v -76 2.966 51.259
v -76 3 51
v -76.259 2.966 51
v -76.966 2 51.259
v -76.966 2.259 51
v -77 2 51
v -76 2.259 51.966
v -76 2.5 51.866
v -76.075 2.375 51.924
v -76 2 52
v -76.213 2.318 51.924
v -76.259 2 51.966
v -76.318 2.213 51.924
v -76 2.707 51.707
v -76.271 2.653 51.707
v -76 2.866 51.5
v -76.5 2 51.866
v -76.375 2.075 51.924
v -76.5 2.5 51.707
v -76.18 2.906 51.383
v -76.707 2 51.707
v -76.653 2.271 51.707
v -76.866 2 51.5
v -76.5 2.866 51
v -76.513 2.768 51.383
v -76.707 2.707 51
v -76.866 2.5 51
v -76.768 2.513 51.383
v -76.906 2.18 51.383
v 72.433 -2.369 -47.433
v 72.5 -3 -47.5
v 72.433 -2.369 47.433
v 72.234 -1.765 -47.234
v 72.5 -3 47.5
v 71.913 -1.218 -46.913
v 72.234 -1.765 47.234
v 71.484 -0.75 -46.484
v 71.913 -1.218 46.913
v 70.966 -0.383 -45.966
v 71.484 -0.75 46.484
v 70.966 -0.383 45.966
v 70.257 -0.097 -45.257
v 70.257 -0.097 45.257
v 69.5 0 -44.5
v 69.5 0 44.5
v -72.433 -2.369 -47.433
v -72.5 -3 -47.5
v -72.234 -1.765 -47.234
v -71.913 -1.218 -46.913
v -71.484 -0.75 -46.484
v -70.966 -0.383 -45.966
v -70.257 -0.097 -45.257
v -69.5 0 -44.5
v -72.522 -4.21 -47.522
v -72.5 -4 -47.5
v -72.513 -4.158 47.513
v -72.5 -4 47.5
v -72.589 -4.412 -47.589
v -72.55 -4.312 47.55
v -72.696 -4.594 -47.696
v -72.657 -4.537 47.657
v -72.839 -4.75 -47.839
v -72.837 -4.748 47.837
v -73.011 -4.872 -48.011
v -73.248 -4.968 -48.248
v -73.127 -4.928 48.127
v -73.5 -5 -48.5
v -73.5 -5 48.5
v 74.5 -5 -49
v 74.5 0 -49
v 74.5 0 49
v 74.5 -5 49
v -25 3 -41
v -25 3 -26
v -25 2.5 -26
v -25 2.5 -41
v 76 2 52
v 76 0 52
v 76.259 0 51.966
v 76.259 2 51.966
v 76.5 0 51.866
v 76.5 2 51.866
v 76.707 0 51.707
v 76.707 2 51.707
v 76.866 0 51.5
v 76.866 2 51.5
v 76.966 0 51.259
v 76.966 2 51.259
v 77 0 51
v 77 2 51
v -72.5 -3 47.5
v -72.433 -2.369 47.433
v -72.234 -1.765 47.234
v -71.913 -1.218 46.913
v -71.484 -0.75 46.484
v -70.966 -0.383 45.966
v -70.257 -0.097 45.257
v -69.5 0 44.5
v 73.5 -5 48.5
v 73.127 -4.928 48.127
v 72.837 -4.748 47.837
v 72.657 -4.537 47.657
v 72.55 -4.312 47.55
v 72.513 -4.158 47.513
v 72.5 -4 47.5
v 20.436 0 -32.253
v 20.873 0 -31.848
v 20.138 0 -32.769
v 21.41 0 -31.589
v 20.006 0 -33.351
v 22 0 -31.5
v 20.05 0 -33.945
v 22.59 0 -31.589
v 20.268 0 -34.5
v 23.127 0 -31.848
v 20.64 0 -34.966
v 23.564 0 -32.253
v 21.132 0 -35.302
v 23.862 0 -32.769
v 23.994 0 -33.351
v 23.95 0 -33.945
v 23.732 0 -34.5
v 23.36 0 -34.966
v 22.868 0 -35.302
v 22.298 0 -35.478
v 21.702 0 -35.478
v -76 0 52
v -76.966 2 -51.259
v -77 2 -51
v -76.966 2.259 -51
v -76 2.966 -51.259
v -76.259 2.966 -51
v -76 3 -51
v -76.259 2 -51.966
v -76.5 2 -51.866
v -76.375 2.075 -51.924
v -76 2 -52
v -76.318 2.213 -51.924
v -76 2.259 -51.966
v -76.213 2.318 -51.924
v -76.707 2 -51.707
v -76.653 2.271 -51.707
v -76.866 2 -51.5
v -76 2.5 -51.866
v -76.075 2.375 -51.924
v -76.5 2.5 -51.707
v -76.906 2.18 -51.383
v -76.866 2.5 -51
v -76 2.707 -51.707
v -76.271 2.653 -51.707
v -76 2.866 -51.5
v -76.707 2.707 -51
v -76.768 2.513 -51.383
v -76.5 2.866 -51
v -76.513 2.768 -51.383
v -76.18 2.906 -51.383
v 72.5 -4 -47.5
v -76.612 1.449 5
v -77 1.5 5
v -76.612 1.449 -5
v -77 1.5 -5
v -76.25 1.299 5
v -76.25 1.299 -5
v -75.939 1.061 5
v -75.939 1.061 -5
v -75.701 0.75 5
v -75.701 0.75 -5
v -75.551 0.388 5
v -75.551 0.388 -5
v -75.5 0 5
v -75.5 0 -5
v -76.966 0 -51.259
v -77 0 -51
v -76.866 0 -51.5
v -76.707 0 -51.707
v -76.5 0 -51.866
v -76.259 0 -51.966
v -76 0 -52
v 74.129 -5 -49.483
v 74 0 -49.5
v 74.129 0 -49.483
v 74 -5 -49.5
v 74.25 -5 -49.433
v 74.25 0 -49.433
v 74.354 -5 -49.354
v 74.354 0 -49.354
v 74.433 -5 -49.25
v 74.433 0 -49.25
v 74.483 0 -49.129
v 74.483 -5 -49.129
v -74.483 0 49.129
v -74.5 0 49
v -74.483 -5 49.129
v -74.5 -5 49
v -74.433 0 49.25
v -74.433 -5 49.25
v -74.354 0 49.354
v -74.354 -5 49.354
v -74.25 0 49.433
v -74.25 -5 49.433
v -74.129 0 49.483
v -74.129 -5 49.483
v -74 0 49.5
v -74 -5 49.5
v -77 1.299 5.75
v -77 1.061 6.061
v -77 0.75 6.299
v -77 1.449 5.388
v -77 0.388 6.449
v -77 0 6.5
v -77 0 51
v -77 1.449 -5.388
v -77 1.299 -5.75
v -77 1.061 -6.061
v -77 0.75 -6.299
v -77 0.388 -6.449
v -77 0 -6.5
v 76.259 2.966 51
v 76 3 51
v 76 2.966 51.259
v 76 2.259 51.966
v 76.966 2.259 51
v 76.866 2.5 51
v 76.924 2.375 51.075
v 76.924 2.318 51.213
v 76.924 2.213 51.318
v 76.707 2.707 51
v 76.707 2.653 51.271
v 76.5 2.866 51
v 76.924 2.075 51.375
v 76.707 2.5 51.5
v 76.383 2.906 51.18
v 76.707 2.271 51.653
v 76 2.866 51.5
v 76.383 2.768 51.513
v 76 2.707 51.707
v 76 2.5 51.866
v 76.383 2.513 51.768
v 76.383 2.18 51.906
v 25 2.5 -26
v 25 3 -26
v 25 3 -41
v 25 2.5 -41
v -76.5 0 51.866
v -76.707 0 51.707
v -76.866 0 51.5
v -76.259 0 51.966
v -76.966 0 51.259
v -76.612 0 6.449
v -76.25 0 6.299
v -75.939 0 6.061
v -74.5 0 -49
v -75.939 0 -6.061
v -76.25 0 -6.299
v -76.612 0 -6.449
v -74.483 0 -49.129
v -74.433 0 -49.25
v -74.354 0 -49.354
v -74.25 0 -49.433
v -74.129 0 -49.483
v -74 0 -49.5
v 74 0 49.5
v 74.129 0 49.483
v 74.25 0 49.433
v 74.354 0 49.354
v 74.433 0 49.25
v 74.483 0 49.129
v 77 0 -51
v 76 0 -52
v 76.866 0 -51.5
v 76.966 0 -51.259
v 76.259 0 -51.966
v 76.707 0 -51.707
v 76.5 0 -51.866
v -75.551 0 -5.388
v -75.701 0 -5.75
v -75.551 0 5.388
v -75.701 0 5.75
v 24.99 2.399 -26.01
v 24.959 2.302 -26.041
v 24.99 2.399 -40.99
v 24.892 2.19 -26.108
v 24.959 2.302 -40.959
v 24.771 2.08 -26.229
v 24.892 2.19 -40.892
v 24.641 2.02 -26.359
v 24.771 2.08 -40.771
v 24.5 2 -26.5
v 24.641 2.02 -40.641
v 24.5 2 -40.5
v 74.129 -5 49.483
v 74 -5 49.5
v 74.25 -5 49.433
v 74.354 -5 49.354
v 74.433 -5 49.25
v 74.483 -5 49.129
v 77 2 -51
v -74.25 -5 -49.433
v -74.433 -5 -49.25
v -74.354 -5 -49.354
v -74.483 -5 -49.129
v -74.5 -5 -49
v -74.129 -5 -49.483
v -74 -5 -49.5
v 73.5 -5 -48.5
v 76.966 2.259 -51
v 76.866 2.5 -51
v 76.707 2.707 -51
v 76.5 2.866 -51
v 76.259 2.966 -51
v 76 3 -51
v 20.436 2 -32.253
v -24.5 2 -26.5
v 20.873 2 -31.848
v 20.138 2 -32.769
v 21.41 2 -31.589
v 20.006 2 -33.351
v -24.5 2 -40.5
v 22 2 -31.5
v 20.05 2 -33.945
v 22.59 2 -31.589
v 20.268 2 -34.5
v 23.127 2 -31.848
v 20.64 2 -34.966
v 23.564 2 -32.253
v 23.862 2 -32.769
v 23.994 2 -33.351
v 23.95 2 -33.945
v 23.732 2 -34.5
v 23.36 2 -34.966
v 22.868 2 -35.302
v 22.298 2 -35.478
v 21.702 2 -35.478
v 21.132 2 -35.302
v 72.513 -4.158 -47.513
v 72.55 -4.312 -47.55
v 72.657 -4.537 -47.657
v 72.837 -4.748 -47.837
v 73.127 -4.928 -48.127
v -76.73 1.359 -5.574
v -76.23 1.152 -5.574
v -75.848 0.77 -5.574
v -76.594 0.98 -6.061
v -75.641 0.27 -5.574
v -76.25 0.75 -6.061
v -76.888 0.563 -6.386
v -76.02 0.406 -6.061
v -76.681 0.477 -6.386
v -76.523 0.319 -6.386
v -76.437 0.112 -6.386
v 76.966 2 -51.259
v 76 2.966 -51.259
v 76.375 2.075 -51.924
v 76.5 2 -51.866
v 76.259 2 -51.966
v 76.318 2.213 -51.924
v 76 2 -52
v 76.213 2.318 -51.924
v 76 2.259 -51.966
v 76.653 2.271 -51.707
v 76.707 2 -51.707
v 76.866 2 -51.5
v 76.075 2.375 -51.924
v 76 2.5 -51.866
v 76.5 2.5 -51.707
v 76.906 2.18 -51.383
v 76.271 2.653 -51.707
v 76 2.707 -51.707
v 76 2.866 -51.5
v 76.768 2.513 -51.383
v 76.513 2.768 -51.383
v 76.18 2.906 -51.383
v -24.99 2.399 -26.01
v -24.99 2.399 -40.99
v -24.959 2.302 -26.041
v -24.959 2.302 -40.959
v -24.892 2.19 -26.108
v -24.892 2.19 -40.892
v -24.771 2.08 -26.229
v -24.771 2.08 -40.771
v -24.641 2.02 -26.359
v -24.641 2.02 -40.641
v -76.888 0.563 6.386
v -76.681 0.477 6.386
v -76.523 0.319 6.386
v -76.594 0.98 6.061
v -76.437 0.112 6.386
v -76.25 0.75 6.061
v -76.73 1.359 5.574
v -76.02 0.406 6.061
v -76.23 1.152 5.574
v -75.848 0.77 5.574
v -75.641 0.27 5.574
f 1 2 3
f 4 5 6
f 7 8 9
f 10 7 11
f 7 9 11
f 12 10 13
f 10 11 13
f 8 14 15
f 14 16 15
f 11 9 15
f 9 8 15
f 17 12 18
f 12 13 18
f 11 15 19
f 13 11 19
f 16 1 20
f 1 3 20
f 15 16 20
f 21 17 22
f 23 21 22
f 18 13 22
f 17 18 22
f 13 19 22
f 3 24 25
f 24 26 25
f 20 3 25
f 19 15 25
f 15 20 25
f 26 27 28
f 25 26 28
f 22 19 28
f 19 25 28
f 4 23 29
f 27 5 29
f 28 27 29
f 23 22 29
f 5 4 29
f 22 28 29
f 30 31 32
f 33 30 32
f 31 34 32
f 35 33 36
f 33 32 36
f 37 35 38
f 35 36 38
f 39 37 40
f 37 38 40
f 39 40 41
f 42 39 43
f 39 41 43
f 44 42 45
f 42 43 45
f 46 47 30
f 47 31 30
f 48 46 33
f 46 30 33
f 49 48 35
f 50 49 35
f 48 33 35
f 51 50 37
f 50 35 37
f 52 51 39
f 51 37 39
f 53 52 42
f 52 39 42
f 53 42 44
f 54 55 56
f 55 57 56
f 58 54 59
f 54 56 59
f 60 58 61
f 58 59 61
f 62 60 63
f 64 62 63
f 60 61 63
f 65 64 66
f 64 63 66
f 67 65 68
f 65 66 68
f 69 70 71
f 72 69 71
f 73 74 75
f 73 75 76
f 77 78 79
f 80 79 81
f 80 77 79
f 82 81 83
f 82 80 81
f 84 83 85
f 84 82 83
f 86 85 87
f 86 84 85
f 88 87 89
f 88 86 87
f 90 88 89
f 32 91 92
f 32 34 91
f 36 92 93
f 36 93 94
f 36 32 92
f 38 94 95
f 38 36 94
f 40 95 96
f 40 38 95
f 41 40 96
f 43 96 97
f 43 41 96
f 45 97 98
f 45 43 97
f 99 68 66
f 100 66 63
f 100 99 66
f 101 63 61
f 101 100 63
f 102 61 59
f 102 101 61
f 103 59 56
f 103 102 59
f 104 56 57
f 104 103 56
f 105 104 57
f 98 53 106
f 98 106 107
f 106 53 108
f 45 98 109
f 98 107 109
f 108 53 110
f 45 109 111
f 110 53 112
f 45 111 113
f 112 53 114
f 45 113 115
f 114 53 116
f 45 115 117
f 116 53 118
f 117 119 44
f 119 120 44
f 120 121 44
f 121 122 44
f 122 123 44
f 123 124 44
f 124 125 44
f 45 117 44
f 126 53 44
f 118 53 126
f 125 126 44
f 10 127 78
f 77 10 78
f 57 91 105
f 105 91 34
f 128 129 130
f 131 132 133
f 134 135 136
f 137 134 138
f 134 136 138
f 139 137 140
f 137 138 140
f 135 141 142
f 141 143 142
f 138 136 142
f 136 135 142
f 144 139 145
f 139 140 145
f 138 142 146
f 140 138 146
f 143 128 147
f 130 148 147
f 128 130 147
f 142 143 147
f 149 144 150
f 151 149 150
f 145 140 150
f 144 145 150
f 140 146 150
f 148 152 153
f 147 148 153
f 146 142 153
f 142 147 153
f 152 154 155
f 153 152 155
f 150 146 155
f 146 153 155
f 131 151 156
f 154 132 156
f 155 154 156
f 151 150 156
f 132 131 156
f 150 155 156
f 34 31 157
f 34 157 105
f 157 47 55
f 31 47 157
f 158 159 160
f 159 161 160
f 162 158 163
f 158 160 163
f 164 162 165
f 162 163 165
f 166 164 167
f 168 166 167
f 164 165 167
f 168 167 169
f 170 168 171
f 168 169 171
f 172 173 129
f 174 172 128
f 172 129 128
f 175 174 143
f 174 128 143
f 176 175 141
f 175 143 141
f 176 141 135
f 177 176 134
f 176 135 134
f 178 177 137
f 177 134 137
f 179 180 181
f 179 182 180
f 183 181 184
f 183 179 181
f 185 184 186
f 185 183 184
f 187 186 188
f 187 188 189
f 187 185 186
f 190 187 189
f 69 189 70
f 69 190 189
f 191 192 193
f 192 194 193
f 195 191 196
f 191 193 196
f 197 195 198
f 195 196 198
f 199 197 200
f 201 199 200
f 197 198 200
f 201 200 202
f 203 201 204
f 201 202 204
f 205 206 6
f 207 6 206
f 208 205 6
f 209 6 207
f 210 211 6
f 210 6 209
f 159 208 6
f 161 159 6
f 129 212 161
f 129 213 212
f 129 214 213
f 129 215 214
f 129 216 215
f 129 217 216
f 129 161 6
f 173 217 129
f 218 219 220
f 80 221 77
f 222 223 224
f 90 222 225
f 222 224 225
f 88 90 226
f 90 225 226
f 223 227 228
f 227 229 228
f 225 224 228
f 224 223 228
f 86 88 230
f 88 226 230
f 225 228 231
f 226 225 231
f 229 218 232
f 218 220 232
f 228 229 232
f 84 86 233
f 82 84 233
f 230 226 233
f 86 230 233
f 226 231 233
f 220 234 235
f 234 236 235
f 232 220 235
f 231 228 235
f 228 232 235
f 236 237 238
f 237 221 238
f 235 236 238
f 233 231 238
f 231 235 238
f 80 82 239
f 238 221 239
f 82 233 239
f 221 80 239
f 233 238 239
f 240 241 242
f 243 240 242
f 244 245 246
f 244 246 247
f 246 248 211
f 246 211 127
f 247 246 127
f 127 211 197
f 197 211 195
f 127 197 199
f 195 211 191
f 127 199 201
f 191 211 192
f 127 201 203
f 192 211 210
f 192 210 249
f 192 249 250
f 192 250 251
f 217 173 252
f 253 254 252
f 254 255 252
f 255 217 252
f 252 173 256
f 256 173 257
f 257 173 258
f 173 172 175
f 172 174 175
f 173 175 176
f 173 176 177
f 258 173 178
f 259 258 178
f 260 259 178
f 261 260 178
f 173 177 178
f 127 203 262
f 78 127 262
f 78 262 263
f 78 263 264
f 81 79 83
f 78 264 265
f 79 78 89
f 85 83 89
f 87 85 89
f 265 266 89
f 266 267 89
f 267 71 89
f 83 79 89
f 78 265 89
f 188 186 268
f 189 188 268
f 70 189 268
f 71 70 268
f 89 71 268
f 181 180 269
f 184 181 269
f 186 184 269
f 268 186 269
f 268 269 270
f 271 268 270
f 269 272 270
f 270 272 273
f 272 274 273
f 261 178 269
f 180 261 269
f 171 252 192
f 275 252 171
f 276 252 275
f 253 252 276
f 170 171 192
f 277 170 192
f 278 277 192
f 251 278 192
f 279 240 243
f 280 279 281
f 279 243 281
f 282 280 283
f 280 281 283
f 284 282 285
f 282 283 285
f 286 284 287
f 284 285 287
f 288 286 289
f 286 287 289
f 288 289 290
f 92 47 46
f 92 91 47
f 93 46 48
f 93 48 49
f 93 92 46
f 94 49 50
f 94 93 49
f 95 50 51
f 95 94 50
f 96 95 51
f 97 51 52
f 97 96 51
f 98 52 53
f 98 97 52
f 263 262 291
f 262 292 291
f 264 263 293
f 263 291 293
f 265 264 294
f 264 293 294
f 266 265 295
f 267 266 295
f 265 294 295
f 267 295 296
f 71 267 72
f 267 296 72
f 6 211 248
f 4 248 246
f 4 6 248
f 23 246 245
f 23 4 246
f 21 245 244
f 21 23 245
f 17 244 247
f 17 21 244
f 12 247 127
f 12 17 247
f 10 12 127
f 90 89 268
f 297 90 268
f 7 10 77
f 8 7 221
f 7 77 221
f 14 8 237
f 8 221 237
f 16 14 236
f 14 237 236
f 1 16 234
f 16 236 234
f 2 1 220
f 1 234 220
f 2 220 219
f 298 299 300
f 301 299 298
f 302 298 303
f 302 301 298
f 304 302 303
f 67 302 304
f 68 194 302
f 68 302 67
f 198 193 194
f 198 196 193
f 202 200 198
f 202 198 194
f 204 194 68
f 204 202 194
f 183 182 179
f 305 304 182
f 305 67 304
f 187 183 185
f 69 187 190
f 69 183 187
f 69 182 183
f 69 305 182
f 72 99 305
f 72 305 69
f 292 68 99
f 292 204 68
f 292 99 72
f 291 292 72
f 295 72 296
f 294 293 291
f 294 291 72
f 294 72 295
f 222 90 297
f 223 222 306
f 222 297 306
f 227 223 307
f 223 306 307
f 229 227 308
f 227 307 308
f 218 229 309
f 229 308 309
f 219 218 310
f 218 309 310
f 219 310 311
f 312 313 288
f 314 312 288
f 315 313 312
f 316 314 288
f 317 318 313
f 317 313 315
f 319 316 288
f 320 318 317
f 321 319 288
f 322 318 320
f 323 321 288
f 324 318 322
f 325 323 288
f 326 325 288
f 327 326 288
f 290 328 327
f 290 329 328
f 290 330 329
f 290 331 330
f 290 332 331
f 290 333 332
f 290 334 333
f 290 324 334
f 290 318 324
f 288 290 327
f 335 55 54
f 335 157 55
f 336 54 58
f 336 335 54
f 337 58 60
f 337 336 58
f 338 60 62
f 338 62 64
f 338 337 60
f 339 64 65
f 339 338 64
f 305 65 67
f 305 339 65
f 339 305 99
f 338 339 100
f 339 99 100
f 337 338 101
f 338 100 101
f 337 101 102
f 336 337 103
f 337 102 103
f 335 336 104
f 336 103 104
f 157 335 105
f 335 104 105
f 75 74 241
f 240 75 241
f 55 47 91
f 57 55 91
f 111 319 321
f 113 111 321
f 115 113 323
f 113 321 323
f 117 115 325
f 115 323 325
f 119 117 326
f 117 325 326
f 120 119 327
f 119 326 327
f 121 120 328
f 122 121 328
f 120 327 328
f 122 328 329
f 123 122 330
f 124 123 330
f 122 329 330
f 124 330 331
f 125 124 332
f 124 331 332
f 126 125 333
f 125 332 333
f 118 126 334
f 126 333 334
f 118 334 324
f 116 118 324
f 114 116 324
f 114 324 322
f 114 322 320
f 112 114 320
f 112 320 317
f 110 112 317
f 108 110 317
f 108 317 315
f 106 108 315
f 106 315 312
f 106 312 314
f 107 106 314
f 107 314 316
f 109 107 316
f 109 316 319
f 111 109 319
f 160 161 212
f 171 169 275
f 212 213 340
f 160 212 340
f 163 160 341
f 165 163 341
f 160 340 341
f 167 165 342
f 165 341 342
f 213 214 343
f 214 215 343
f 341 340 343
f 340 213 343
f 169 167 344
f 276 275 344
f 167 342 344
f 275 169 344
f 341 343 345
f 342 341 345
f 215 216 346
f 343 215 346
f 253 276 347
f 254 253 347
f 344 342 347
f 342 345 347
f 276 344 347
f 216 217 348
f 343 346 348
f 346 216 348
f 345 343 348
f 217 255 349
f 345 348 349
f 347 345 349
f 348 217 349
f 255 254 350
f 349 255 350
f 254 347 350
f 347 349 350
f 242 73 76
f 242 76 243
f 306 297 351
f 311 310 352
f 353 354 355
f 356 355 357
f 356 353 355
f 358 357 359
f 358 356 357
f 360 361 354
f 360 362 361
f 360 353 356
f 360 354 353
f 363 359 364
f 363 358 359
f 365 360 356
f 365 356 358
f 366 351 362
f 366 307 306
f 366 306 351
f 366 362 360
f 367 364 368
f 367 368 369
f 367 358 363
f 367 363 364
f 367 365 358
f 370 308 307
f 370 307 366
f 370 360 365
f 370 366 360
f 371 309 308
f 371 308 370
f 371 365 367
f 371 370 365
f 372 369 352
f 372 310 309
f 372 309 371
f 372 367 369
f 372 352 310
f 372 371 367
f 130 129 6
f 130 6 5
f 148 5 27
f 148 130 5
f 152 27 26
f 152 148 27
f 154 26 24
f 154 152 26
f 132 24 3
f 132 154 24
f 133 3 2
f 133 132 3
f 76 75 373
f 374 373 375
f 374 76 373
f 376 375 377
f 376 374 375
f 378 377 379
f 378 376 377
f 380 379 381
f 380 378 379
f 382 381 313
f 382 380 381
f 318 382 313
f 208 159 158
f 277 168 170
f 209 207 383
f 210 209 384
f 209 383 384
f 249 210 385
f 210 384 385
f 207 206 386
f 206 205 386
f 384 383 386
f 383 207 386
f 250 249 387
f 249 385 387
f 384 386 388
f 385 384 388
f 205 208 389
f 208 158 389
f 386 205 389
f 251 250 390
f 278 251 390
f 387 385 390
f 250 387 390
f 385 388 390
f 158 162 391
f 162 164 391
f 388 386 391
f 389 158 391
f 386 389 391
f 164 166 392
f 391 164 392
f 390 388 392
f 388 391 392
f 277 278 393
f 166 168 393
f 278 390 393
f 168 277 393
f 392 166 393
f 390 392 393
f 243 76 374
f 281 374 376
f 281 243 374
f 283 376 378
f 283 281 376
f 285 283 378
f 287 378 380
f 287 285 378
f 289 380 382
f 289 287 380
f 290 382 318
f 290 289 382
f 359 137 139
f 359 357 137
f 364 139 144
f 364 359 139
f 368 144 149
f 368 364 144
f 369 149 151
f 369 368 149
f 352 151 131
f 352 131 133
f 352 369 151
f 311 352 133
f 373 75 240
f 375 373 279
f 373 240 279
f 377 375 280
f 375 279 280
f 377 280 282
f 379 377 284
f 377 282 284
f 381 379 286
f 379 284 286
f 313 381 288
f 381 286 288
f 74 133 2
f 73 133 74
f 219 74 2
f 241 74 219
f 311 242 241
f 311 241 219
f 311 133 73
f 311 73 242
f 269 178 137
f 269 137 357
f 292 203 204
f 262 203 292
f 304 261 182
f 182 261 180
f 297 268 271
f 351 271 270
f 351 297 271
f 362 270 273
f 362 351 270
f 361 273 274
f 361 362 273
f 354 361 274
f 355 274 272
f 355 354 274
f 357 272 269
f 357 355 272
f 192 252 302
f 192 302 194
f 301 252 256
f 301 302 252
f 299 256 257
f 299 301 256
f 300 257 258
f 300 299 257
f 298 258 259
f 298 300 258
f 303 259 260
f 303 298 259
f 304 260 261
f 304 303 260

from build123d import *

# Parameters (mm, degrees)
SKETCH1_W           = 154
SKETCH1_H           = 104
BOSS_EXTRUDE1_DEPTH = 3
FILLET1_R           = 1
SKETCH2_W           = 149
SKETCH2_H           = 99
SKETCH2_W_2         = 145
SKETCH2_H_2         = 95
EXTRUDE_THIN1_DEPTH = 5
FILLET2_R           = 3
FILLET3_R           = 1
CUT_REVOLVE1_ANGLE  = 90
SKETCH5_W           = 50
SKETCH5_H           = 15
CUT_EXTRUDE1_DEPTH  = 1
FILLET4_R           = 0.5
SKETCH6_R           = 2
CUT_EXTRUDE2_DEPTH  = 5
FILLET5_R           = 0.5


with BuildPart() as part:
    # Sketch1 → Boss-Extrude1 (new body)
    with BuildSketch(Plane(origin=(0, 0, 0), x_dir=(1, 0, 0), z_dir=(0, 1, 0))):
        Rectangle(SKETCH1_W, SKETCH1_H)
    extrude(amount=BOSS_EXTRUDE1_DEPTH)

    # Fillet1
    fillet1_edges = [part.edges().sort_by_distance(p)[0] for p in [
        (-77, 3, 0),
        (0, 3, 52),
        (77, 3, 0),
        (77, 1.5, 52),
        (-77, 1.5, 52),
        (-77, 1.5, -52),
        (77, 1.5, -52),
        (0, 3, -52),
    ]]
    fillet(fillet1_edges, radius=FILLET1_R)

    # Sketch2 → Extrude-Thin1 (add)
    with BuildSketch(Plane.XZ):
        Rectangle(SKETCH2_W, SKETCH2_H)
        Rectangle(SKETCH2_W_2, SKETCH2_H_2, mode=Mode.SUBTRACT)
    extrude(amount=EXTRUDE_THIN1_DEPTH)

    # Fillet2
    fillet2_edges = [part.edges().sort_by_distance(p)[0] for p in [
        (72.5, 0, 0),
        (0, 0, 47.5),
        (-72.5, 0, 0),
        (0, 0, -47.5),
    ]]
    fillet(fillet2_edges, radius=FILLET2_R)

    # Fillet3
    fillet3_edges = [part.edges().sort_by_distance(p)[0] for p in [
        (72.5, -5, 0),
        (0, -5, 47.5),
        (-72.5, -5, 0),
        (0, -5, -47.5),
    ]]
    fillet(fillet3_edges, radius=FILLET3_R)

    # Sketch3 → Cut-Revolve1 (revolve, cut)
    with BuildSketch(Plane.ZY.offset(77)):
        with BuildLine():
            Line((-6.5, 0), (6.5, 0))
            ThreePointArc((6.5, 0), (6.060660172, 1.060660172), (5, 1.5))
            Line((5, 1.5), (-5, 1.5))
            ThreePointArc((-5, 1.5), (-6.060660172, 1.060660172), (-6.5, 0))
        make_face()
    revolve(axis=Axis((-77, 0, -6.5), (0, 0, -1)), revolution_arc=CUT_REVOLVE1_ANGLE, mode=Mode.SUBTRACT)

    # Sketch5 → Cut-Extrude1 (cut)
    with BuildSketch(Plane(origin=(0, 3, 0), x_dir=(1, 0, 0), z_dir=(0, 1, 0))):
        with Locations((0, 33.5)):
            Rectangle(SKETCH5_W, SKETCH5_H)
    extrude(amount=-CUT_EXTRUDE1_DEPTH, mode=Mode.SUBTRACT)

    # Fillet4
    fillet4_edges = [part.edges().sort_by_distance(p)[0] for p in [
        (74.5, -2.5, -49.5),
        (74.5, -2.5, 49.5),
        (-74.5, -2.5, 49.5),
        (-74.5, -2.5, -49.5),
    ]]
    fillet(fillet4_edges, radius=FILLET4_R)

    # Sketch6 → Cut-Extrude2 (cut)
    with BuildSketch(Plane(origin=(0, 2, 0), x_dir=(1, 0, 0), z_dir=(0, 1, 0))):
        with Locations(Location((22, 33.5, 0), (0, 0, 270))):
            Circle(SKETCH6_R)
    extrude(amount=-CUT_EXTRUDE2_DEPTH, mode=Mode.SUBTRACT)

    # Fillet5
    fillet5_edges = [part.edges().sort_by_distance(p)[0] for p in [
        (25, 2, -33.5),
        (0, 2, -26),
        (-25, 2, -33.5),
        (0, 2, -41),
    ]]
    fillet(fillet5_edges, radius=FILLET5_R)


solid = part.part
